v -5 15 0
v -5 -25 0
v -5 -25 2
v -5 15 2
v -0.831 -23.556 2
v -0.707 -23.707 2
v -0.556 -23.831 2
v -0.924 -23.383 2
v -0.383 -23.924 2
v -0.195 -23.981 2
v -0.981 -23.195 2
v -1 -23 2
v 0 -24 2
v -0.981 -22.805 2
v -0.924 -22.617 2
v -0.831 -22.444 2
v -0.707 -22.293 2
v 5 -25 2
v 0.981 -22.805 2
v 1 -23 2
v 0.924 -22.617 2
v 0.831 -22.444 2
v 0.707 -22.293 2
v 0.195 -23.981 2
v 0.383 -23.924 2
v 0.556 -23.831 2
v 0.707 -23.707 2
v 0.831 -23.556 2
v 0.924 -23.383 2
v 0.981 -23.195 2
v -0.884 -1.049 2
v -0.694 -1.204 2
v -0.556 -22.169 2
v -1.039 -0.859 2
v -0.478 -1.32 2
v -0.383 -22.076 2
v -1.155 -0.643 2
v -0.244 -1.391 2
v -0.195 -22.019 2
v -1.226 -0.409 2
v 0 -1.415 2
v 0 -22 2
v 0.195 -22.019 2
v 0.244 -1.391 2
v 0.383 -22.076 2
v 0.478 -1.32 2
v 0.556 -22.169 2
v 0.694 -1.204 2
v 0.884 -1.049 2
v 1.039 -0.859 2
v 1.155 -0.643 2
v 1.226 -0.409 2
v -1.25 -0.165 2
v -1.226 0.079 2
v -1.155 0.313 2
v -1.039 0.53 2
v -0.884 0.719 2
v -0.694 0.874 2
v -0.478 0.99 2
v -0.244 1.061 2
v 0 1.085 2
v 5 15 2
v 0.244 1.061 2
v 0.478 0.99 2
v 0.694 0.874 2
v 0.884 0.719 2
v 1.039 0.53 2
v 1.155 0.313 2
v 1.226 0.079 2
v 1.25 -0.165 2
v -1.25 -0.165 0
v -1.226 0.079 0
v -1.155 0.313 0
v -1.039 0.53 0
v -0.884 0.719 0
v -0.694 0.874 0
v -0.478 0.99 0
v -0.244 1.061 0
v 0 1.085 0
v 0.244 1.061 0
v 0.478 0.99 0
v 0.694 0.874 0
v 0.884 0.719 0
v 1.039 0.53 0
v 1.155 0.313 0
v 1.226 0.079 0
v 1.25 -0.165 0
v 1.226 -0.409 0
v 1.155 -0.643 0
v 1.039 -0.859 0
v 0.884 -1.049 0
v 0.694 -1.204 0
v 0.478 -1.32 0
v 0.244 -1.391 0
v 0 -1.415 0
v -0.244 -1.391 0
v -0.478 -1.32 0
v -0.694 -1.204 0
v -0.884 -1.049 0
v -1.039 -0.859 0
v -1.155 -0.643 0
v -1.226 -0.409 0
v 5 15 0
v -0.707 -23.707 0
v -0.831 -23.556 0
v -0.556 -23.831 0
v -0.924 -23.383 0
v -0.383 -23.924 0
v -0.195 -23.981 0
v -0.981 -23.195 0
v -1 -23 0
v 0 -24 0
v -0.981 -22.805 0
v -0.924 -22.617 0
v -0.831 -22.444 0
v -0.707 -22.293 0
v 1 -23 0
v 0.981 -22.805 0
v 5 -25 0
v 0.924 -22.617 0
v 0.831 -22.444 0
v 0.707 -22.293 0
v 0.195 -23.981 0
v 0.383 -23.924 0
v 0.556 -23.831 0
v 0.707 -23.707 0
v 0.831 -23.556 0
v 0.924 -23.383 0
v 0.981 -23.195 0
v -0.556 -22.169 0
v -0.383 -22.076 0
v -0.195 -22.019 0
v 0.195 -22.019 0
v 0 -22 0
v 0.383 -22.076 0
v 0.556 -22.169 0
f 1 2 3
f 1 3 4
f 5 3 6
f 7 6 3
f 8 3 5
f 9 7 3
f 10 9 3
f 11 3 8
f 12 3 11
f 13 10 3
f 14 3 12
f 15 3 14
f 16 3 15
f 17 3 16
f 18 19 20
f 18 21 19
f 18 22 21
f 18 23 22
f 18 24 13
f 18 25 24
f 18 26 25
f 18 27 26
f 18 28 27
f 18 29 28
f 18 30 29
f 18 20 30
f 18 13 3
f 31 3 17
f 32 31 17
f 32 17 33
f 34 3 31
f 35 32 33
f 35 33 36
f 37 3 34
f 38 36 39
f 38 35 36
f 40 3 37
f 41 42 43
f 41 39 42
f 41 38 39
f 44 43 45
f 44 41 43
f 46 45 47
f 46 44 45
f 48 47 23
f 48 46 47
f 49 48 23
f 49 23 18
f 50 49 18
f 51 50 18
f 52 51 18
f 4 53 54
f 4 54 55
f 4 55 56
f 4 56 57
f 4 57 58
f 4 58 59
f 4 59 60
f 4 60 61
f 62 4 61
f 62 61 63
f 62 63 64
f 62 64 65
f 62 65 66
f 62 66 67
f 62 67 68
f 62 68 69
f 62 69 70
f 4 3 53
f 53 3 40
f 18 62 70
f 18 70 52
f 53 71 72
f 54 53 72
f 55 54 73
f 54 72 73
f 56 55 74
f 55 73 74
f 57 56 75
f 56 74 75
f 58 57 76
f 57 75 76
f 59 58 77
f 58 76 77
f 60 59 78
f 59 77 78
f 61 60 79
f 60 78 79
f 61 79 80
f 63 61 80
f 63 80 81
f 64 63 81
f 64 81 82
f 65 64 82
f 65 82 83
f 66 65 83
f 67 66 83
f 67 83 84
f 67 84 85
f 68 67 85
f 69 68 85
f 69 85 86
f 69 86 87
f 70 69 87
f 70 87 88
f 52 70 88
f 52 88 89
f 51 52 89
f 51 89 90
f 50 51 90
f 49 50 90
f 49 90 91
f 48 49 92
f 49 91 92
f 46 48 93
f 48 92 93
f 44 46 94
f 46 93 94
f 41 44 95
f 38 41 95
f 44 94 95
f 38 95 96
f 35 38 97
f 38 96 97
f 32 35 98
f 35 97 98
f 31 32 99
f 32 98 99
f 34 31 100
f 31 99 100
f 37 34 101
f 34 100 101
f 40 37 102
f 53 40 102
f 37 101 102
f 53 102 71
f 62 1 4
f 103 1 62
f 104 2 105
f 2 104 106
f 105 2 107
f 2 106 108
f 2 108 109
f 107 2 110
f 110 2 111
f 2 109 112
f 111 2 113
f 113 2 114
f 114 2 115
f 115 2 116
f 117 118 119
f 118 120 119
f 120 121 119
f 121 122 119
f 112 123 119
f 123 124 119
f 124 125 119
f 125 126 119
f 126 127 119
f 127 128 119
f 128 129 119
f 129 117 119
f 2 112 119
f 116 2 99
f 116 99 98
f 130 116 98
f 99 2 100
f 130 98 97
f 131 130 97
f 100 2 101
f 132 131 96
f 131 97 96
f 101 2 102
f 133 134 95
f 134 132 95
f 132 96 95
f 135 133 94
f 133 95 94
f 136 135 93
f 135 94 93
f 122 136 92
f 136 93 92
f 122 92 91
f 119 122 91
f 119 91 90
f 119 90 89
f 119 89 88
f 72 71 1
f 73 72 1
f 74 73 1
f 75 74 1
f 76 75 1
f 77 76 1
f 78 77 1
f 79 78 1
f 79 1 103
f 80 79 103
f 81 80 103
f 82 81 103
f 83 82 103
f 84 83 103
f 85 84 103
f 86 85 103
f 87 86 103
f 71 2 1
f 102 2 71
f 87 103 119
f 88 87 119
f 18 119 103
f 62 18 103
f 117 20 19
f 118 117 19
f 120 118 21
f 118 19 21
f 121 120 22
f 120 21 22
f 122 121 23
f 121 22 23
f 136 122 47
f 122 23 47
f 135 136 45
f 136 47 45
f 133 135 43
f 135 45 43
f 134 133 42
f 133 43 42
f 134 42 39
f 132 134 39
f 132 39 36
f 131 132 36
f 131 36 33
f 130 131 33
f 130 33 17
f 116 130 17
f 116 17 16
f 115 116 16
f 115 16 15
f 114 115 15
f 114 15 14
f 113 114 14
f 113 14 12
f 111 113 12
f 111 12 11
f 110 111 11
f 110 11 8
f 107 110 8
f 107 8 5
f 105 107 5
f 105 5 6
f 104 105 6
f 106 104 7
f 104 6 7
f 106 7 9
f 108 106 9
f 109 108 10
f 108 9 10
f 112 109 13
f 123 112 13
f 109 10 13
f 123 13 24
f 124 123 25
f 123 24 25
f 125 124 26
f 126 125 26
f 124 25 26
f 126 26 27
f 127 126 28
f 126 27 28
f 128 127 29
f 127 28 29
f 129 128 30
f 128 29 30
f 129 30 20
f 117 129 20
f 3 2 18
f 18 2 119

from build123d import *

# Parameters (mm, degrees)
SKETCH1_W             = 10
SKETCH1_H             = 40
BOSS_EXTRUDE1_DEPTH   = 2
M3X0_5_TAPPED_HOLE1_D = 2.5
CUT_EXTRUDE1_REACH    = 27.573
SKETCH6_R             = 1


with BuildPart() as part:
    # Sketch1 → Boss-Extrude1 (new body)
    with BuildSketch(Plane.XY):
        with Locations((0, -5)):
            Rectangle(SKETCH1_W, SKETCH1_H)
    extrude(amount=BOSS_EXTRUDE1_DEPTH)

    # M3x0.5 Tapped Hole1 (through all)
    with Locations(Plane.XY.offset(2)):
        with Locations((0, -0.164876805)):
            Hole(M3X0_5_TAPPED_HOLE1_D / 2)

    # Sketch6 → Cut-Extrude1 (cut, up to next)
    with BuildSketch(Plane.XY.offset(2), mode=Mode.PRIVATE) as cut_extrude1_sk1:
        with Locations((0, -23)):
            Circle(SKETCH6_R)
    cut_extrude1_tool1 = extrude(cut_extrude1_sk1.sketch, amount=-CUT_EXTRUDE1_REACH, mode=Mode.PRIVATE) & part.part
    add(cut_extrude1_tool1.solids().sort_by_distance((0, -23, 2))[0], mode=Mode.SUBTRACT)


solid = part.part
